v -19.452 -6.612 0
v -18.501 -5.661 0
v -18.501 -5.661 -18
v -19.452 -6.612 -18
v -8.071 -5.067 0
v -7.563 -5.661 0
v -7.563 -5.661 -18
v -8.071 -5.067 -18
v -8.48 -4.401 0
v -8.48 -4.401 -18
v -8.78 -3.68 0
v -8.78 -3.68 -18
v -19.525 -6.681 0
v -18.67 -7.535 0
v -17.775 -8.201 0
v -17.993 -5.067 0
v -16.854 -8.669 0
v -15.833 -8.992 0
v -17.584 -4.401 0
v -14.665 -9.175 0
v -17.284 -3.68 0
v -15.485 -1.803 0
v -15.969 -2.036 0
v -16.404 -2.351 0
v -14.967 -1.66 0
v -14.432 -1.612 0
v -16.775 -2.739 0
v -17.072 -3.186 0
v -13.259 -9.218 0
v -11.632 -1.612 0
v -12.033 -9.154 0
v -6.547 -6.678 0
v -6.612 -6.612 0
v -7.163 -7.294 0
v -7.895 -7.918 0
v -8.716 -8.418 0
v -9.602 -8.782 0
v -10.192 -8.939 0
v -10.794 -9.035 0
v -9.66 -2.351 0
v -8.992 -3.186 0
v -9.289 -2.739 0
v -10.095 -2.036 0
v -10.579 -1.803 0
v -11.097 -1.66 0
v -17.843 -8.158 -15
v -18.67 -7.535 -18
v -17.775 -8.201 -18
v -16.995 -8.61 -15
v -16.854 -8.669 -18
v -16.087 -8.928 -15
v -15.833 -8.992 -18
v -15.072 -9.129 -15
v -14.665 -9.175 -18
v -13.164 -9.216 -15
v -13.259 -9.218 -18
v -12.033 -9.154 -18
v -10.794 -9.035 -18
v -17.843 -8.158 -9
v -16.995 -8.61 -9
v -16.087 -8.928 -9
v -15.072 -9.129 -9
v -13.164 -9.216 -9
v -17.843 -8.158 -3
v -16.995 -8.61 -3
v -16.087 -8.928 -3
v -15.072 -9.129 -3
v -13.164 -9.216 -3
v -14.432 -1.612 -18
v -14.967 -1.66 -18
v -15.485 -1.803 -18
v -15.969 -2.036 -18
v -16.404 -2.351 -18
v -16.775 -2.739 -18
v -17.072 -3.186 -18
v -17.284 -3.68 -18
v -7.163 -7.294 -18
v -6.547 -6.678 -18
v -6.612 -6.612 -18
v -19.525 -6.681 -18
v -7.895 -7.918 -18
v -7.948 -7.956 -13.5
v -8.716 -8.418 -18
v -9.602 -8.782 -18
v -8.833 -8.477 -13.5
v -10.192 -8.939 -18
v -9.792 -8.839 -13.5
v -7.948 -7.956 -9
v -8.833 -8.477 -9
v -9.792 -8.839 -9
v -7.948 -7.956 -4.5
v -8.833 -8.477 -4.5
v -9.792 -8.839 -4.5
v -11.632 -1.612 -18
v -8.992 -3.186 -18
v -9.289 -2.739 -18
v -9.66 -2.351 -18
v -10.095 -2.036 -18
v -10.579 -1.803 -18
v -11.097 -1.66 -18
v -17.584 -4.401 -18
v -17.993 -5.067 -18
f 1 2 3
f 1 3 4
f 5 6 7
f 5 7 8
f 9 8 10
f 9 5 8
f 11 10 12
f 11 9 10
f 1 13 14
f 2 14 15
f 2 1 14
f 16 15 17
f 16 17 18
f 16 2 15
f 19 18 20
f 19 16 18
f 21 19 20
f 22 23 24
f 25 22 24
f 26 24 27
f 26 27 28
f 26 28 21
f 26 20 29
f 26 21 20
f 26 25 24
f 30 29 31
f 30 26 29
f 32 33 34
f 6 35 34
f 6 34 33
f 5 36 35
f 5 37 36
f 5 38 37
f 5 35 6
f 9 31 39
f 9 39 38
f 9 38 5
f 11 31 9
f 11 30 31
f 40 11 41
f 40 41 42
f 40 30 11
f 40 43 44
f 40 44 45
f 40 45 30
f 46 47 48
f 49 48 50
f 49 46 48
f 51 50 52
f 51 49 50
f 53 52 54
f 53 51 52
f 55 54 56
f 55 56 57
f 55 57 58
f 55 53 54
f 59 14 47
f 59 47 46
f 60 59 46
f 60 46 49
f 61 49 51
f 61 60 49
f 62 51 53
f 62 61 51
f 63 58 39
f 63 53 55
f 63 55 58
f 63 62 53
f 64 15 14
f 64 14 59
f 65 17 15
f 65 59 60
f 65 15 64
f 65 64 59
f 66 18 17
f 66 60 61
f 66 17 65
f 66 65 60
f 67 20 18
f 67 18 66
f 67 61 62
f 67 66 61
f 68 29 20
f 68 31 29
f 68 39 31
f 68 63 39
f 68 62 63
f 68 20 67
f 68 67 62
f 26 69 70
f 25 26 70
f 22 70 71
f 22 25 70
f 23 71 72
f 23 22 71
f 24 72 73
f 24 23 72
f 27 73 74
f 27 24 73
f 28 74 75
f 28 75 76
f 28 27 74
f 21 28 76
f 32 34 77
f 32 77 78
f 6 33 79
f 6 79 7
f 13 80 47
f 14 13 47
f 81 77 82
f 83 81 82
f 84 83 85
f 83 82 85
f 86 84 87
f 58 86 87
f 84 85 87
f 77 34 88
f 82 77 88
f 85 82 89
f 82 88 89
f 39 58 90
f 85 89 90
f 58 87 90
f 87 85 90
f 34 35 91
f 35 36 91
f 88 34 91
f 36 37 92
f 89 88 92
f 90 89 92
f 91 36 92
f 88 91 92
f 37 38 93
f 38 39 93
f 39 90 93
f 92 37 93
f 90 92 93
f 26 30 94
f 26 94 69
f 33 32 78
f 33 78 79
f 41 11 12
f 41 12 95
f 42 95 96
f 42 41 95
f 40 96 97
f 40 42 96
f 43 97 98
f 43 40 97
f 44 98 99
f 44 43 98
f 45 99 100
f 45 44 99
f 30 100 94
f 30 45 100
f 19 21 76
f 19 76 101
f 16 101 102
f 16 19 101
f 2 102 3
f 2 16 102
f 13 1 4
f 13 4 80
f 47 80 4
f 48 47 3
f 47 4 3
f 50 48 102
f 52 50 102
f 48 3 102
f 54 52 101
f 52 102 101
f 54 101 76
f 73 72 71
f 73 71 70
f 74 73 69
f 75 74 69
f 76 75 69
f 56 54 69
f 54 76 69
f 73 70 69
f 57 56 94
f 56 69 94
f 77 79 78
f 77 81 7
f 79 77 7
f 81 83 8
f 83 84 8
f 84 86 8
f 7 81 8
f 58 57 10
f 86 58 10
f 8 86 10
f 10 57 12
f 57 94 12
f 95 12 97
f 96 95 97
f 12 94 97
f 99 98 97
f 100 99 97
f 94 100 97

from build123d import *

# Parameters (mm, degrees)
BOSS_EXTRUDE1_DEPTH = 18


with BuildPart() as part:
    # Sketch1 → Boss-Extrude1 (new body)
    with BuildSketch(Plane.XY):
        with BuildLine():
            Line((-7.163105934, -7.293646663), (-6.547062338, -6.677603067))
            Line((-6.547062338, -6.677603067), (-6.612332703, -6.612332703))
            Line((-6.612332703, -6.612332703), (-7.563291756, -5.661373649))
            ThreePointArc((-7.563291756, -5.661373649), (-8.288491154, -4.742354928), (-8.78011552, -3.679897843))
            ThreePointArc((-8.78011552, -3.679897843), (-9.870465754, -2.18361858), (-11.631530122, -1.612332703))
            Line((-11.631530122, -1.612332703), (-14.432396648, -1.612332703))
            ThreePointArc((-14.432396648, -1.612332703), (-16.193461017, -2.18361858), (-17.28381125, -3.679897843))
            ThreePointArc((-17.28381125, -3.679897843), (-17.775435616, -4.742354928), (-18.500635014, -5.661373649))
            Line((-18.500635014, -5.661373649), (-19.451594068, -6.612332703))
            Line((-19.451594068, -6.612332703), (-19.524780345, -6.680666225))
            Line((-19.524780345, -6.680666225), (-18.670477775, -7.534870352))
            add(Edge.make_bspline(
                [(-18.670477775, -7.534870352), (-18.125131144, -8.012979969), (-17.277228248, -8.540037204), (-16.066456083, -8.958058574), (-14.806247878, -9.200473351), (-13.120861063, -9.255335571), (-11.668367706, -9.128182371), (-10.874120868, -9.043245859), (-10.794454533, -9.034648972)],
                knots=[0, 0, 0, 0, 0.231047832, 0.35138283, 0.481745746, 0.716877708, 0.971604001, 1, 1, 1, 1], degree=3, weights=[1, 1, 1, 1, 1, 1, 1, 1, 1]))
            add(Edge.make_bspline(
                [(-7.163105934, -7.293646663), (-7.528267353, -7.658808082), (-7.948111458, -7.955995317), (-8.369394277, -8.254200947), (-8.833411811, -8.476523795), (-9.296011092, -8.69816712), (-9.792074347, -8.839471582), (-10.28381467, -8.979544649), (-10.794454533, -9.034648972)],
                knots=[0, 0, 0, 0.25, 0.25, 0.5, 0.5, 0.75, 0.75, 1, 1, 1], degree=2))
        make_face()
    extrude(amount=-BOSS_EXTRUDE1_DEPTH)


solid = part.part
